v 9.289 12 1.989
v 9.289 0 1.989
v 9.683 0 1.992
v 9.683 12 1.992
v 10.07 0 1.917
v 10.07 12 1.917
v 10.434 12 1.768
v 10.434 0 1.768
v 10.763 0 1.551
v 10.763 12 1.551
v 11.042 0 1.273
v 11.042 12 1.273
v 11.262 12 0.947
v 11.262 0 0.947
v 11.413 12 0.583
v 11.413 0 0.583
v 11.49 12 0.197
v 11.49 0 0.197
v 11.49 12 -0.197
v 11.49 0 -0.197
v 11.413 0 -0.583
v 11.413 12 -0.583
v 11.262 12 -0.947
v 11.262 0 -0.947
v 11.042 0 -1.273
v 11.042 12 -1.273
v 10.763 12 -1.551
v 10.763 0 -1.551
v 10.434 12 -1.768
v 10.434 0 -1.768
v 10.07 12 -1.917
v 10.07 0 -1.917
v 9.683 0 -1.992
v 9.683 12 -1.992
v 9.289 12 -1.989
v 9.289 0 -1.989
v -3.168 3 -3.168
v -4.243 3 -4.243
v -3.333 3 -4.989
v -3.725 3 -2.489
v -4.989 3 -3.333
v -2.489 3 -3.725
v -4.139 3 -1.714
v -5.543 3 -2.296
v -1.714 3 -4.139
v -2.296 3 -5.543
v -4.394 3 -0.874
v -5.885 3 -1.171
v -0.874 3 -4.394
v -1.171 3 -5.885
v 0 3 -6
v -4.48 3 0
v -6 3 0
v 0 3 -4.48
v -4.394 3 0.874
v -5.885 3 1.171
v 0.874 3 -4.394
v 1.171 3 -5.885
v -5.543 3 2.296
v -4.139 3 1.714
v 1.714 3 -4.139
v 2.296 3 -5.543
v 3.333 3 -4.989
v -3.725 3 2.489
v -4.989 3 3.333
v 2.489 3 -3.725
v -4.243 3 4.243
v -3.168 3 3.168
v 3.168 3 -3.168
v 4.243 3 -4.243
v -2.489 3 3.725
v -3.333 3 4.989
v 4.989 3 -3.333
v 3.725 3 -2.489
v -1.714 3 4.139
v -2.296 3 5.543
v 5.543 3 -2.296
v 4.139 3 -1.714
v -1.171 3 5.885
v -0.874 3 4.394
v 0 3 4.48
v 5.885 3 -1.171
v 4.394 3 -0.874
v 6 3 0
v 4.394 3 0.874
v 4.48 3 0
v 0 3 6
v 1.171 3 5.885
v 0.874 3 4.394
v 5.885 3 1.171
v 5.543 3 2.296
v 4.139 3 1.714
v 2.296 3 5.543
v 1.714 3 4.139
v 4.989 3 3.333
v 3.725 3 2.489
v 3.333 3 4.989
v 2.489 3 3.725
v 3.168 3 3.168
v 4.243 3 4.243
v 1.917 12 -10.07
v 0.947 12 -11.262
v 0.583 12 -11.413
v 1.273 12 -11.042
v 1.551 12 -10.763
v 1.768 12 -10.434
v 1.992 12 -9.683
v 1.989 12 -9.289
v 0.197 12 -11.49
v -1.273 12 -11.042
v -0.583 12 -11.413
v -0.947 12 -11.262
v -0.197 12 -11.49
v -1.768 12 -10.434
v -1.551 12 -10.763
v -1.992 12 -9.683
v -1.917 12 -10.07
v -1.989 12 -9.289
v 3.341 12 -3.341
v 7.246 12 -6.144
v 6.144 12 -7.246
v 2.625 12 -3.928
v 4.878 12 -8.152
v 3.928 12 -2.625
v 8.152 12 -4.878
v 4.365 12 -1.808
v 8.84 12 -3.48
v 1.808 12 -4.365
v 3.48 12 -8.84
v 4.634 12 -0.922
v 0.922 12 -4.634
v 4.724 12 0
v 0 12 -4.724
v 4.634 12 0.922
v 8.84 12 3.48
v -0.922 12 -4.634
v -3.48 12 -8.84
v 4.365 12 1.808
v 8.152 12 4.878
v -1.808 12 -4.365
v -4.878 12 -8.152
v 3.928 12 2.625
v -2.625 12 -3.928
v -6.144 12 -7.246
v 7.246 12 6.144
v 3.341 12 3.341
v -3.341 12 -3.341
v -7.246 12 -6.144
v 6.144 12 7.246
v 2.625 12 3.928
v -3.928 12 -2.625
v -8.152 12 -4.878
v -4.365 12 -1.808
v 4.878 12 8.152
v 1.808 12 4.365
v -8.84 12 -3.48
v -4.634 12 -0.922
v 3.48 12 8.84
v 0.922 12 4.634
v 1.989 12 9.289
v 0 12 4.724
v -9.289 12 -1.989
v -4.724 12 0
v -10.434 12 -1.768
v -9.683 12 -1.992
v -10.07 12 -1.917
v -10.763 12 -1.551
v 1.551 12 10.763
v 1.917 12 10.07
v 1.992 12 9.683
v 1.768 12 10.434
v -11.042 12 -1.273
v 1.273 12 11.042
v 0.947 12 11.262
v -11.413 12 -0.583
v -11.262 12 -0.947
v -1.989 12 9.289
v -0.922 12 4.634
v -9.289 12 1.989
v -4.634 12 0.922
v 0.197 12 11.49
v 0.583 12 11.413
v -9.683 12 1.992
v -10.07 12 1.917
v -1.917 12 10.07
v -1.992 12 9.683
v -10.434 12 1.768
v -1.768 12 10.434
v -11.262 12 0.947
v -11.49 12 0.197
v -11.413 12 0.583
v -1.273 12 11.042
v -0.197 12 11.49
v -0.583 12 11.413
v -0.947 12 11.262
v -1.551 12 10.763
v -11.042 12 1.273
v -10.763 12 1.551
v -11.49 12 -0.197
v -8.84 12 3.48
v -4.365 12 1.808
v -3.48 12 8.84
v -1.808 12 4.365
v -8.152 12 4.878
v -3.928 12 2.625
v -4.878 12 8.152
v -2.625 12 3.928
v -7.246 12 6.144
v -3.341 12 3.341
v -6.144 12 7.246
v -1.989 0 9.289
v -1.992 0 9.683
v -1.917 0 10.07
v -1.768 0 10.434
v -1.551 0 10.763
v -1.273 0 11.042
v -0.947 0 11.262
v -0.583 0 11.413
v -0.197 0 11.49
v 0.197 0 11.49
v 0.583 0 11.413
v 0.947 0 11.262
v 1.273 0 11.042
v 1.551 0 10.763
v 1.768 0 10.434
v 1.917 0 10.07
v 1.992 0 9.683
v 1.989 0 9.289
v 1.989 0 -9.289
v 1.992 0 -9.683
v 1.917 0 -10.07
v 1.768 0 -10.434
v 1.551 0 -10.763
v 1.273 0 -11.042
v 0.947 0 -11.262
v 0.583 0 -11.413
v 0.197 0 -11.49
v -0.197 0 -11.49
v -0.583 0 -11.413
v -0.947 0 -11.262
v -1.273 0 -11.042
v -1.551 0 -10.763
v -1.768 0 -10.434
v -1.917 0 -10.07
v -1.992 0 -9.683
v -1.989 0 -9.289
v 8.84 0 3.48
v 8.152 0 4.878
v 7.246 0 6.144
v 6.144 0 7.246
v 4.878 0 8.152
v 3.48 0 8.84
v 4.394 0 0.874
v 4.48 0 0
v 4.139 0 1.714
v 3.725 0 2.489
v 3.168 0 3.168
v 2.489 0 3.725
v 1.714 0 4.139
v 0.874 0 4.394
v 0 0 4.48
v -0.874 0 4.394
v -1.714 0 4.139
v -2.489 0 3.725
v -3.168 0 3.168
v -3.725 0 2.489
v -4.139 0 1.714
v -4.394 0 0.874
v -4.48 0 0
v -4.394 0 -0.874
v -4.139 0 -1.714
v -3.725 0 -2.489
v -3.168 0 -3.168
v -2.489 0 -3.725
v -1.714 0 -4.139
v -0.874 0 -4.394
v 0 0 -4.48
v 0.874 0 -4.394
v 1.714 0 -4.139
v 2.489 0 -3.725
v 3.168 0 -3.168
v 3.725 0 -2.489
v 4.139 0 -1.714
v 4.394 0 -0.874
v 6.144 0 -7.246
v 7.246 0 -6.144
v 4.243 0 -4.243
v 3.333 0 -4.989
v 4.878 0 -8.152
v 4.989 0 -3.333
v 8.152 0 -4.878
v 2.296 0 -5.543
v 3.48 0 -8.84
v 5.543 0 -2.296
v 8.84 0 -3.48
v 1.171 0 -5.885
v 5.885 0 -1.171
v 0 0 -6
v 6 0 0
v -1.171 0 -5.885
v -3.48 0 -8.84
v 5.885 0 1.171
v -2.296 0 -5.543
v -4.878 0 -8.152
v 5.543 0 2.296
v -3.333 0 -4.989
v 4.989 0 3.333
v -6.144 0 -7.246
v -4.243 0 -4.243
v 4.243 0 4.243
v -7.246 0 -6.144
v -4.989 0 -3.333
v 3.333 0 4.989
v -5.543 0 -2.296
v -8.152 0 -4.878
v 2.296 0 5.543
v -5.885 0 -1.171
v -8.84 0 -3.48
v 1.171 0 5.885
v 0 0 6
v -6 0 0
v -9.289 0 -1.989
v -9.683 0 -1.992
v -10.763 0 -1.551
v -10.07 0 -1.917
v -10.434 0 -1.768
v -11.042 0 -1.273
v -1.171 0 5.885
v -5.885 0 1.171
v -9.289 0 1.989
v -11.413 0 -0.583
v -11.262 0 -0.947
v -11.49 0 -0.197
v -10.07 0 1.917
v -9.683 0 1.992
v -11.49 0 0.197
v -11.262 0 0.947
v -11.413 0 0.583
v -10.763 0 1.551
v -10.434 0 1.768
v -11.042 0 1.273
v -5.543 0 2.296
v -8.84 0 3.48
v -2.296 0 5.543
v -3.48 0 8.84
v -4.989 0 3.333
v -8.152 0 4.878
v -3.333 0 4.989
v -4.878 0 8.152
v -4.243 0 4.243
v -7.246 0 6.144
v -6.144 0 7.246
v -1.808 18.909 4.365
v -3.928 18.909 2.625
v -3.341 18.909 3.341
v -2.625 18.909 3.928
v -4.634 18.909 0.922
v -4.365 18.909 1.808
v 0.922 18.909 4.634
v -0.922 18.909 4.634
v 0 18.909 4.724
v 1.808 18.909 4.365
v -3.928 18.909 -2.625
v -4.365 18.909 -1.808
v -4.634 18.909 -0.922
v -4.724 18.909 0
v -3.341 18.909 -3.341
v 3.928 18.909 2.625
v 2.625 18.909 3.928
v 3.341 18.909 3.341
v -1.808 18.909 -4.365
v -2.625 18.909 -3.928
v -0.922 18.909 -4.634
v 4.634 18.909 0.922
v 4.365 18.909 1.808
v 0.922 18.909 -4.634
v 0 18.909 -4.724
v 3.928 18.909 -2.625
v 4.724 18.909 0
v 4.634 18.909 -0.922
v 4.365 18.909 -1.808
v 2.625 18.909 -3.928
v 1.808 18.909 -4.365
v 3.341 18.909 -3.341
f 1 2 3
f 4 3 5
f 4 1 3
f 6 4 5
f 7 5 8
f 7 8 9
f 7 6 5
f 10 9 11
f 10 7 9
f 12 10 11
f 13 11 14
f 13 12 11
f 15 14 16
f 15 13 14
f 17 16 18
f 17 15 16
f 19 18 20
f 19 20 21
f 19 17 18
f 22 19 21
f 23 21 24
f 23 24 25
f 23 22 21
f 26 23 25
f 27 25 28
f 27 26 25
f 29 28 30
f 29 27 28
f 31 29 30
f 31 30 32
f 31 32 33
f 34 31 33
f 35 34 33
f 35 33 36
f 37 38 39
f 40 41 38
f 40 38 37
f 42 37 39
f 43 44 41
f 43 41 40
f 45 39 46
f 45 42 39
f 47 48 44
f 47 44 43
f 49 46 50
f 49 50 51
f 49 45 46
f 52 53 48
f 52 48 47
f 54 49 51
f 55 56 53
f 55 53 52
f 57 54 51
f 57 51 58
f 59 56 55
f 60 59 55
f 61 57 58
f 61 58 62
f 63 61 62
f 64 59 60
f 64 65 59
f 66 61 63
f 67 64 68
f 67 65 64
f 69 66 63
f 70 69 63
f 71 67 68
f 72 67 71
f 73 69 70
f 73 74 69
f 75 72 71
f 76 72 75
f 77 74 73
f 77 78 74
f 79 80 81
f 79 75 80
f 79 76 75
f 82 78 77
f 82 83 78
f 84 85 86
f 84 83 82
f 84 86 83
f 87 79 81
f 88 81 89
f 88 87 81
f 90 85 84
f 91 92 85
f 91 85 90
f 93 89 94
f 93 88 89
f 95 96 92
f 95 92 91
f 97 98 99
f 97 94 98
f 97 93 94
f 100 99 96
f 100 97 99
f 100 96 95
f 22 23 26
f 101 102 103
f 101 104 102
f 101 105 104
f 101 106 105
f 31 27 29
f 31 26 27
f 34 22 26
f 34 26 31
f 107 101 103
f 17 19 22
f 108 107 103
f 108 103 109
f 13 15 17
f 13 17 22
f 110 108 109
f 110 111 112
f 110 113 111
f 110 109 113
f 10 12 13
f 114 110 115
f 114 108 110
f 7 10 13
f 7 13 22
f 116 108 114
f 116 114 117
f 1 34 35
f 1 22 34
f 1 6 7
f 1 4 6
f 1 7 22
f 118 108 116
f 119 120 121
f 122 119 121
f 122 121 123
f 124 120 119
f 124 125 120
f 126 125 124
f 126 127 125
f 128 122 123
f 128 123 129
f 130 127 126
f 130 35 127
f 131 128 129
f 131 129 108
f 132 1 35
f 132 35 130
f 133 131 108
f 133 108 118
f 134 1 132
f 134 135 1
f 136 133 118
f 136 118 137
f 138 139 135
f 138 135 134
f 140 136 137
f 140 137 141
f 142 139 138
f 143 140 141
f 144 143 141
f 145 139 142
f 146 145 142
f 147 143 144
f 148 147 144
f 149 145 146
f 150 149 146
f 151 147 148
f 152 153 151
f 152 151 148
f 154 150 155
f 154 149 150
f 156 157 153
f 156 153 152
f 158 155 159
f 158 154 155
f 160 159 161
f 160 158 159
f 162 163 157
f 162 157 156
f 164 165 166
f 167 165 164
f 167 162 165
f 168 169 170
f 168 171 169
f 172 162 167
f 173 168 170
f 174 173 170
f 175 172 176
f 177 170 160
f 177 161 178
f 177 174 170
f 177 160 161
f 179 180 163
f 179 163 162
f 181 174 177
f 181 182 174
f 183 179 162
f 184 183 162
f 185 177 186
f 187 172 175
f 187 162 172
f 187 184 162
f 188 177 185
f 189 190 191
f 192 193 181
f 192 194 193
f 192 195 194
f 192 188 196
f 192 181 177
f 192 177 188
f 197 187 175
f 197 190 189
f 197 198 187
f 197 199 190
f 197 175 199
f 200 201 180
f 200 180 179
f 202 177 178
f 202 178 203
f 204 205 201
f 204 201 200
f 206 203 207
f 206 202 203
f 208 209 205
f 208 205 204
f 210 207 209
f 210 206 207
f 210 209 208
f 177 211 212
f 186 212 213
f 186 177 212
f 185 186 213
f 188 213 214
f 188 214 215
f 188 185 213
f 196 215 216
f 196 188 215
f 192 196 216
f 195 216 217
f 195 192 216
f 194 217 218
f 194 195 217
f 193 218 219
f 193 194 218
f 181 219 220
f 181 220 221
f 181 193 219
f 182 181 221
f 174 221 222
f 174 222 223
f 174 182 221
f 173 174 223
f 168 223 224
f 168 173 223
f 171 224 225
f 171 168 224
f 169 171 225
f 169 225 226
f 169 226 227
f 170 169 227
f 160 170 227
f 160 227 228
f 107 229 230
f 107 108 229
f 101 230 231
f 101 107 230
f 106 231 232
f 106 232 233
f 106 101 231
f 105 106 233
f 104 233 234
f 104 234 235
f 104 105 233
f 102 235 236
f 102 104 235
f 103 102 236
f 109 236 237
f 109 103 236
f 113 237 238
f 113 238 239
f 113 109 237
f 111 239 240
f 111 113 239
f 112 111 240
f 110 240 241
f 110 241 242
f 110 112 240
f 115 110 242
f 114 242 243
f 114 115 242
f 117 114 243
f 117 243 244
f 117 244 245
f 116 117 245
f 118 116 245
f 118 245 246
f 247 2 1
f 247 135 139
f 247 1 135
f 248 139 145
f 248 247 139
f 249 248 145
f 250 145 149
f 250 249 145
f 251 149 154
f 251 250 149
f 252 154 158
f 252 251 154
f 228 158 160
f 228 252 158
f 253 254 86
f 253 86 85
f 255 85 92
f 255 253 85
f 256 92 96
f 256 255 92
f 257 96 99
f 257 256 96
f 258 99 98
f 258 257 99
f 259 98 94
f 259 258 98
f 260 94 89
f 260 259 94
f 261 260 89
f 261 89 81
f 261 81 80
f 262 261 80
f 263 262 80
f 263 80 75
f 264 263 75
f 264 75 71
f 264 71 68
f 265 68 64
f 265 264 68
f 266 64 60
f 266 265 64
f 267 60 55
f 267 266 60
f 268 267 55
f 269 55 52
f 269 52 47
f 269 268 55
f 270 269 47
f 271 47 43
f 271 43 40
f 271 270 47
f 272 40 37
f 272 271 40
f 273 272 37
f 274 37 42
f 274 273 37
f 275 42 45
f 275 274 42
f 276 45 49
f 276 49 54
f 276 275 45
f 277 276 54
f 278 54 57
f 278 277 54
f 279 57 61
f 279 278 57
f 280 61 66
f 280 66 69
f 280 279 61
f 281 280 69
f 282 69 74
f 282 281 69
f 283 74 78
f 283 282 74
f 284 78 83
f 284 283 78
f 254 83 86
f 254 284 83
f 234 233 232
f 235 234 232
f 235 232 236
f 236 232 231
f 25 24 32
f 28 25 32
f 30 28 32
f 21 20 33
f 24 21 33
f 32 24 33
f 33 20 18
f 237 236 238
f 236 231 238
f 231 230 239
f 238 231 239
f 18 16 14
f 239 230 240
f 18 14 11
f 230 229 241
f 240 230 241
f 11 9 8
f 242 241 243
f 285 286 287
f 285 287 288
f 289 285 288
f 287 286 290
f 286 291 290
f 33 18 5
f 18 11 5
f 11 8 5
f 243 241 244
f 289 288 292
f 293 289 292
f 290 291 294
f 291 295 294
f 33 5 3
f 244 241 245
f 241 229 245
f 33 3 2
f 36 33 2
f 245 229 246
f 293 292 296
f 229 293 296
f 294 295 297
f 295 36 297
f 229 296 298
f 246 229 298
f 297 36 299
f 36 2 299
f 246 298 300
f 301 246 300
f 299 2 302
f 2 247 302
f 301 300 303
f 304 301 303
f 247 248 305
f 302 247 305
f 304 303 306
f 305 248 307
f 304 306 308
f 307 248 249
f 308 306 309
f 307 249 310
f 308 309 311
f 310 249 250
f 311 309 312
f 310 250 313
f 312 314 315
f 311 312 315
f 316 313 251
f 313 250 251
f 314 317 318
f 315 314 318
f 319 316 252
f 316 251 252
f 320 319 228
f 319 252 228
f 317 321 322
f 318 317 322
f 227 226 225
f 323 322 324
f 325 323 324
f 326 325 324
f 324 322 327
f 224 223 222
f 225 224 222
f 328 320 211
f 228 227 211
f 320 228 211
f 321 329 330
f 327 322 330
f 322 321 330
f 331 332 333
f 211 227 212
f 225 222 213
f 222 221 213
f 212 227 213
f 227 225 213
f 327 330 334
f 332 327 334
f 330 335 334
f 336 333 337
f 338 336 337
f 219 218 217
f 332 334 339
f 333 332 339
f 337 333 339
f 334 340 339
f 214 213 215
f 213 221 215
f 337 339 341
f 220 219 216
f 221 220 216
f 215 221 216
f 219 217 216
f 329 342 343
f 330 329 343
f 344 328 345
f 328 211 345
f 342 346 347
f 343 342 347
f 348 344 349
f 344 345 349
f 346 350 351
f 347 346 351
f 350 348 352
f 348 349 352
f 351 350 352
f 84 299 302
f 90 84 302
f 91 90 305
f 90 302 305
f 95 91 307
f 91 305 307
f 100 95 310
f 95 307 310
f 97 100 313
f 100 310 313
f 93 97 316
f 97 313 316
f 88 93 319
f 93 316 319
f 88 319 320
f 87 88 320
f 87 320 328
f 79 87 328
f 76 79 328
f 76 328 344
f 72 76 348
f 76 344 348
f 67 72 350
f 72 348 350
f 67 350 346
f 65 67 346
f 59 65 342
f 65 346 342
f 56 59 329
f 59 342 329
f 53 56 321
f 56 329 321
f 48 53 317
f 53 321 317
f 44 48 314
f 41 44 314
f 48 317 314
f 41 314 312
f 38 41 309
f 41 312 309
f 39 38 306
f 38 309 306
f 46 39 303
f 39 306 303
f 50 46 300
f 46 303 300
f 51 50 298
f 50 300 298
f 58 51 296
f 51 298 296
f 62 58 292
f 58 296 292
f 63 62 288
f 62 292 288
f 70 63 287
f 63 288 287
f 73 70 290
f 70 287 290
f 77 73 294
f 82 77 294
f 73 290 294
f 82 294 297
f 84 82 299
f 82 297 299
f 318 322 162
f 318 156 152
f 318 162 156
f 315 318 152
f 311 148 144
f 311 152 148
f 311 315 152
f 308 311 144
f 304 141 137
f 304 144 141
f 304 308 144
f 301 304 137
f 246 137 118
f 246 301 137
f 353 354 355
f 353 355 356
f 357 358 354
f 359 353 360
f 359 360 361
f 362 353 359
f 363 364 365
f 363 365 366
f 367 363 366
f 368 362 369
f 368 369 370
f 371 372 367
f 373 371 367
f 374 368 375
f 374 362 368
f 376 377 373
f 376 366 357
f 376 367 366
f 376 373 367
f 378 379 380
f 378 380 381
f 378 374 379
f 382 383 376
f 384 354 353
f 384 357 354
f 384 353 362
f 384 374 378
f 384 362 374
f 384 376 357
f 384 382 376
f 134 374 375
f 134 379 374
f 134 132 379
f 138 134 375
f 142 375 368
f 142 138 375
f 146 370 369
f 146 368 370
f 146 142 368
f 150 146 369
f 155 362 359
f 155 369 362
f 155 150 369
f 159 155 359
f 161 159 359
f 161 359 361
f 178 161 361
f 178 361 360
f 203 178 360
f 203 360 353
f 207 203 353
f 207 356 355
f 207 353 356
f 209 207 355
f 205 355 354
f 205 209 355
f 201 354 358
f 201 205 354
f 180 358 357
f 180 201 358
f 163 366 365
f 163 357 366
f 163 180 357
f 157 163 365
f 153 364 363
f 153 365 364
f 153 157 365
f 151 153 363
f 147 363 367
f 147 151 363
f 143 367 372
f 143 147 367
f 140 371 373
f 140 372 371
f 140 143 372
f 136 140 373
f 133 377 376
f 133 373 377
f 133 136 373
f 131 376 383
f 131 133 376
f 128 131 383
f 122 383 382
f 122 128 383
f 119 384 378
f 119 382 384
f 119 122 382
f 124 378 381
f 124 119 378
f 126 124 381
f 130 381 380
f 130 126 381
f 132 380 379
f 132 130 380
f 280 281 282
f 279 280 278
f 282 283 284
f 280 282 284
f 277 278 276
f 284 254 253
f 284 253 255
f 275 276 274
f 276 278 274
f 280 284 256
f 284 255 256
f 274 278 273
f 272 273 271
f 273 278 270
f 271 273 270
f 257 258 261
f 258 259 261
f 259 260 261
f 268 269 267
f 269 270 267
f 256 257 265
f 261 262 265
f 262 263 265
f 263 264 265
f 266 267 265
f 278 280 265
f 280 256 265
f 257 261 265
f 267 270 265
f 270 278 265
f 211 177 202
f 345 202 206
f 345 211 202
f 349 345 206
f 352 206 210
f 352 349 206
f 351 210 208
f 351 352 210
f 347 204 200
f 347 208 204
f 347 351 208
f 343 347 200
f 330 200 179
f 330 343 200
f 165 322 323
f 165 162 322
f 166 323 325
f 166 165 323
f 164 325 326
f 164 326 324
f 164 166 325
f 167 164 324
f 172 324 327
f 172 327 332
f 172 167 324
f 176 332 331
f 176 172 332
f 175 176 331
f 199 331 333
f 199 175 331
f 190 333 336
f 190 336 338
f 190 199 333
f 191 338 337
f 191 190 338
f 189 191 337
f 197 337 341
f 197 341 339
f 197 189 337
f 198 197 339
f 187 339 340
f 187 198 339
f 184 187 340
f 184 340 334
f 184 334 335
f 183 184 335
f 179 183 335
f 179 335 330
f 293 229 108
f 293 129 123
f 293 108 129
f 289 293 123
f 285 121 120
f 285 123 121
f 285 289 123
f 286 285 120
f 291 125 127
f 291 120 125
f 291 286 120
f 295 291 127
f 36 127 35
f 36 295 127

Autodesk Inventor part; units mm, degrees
ref_plane "YZ Plane" through (0, 0, 0) normal (1, 0, 0) x (0, 1, 0)
ref_plane "XZ Plane" through (0, 0, 0) normal (0, 1, 0) x (-1, 0, 0)
ref_plane "XY Plane" through (0, 0, 0) normal (0, 0, 1) x (1, 0, 0)
sketch "Sketch1" plane through (0, 0, 0) normal (0, 1, 0) x (-1, 0, 0)
  circle A0 centre (0, 0) radius 9.5
  dimension "d0" = 19
extrude "Extrusion1" add sketch "Sketch1" along normal blind 12
sketch "Sketch2" plane through (0, 12, 0) normal (0, 1, 0) x (1, 0, 0)
  circle A0 centre (0, 0) radius 4.7244
  dimension "d9" = 9.4488
extrude "Extrusion2" add sketch "Sketch2" along normal blind 6.9088
sketch "Sketch3" plane through (0, 0, 0) normal (0, -1, 0) x (1, 0, 0)
  circle A0 centre (0, 0) radius 4.48
  circle A1 centre (0, 0) radius 6
  dimension "d5" = 12
  dimension "d6" = 1.52
extrude "Extrusion3" cut sketch "Sketch3" against normal blind 3
sketch "Sketch4" plane through (0, 12, 0) normal (0, 1, 0) x (1, 0, 0)
  circle A0 centre (0, 0) radius 9.5 projected
  circle A1 centre (-9.5, 0) radius 2
  line L0 (-15.7, 0) -> (13.7, 0) projected
  point P0 (-9.2895, 1.9889)
  point P1 (-9.2895, -1.9889)
  dimension "d10" = 4
extrude "Extrusion4" add sketch "Sketch4" against normal up to surface (12 mm away) contours A0 L0 A1 | A1 L0 A0 picked at (-10.0838, 0.5297) picked at (-10.0838, -0.5297)
pattern_circular "Circular Pattern1" count 4 over 360 about axis through (0, 0, 0) along (0, 1, 0) of "Extrusion4"
properties part number "Acople Resorte-Marcador"
